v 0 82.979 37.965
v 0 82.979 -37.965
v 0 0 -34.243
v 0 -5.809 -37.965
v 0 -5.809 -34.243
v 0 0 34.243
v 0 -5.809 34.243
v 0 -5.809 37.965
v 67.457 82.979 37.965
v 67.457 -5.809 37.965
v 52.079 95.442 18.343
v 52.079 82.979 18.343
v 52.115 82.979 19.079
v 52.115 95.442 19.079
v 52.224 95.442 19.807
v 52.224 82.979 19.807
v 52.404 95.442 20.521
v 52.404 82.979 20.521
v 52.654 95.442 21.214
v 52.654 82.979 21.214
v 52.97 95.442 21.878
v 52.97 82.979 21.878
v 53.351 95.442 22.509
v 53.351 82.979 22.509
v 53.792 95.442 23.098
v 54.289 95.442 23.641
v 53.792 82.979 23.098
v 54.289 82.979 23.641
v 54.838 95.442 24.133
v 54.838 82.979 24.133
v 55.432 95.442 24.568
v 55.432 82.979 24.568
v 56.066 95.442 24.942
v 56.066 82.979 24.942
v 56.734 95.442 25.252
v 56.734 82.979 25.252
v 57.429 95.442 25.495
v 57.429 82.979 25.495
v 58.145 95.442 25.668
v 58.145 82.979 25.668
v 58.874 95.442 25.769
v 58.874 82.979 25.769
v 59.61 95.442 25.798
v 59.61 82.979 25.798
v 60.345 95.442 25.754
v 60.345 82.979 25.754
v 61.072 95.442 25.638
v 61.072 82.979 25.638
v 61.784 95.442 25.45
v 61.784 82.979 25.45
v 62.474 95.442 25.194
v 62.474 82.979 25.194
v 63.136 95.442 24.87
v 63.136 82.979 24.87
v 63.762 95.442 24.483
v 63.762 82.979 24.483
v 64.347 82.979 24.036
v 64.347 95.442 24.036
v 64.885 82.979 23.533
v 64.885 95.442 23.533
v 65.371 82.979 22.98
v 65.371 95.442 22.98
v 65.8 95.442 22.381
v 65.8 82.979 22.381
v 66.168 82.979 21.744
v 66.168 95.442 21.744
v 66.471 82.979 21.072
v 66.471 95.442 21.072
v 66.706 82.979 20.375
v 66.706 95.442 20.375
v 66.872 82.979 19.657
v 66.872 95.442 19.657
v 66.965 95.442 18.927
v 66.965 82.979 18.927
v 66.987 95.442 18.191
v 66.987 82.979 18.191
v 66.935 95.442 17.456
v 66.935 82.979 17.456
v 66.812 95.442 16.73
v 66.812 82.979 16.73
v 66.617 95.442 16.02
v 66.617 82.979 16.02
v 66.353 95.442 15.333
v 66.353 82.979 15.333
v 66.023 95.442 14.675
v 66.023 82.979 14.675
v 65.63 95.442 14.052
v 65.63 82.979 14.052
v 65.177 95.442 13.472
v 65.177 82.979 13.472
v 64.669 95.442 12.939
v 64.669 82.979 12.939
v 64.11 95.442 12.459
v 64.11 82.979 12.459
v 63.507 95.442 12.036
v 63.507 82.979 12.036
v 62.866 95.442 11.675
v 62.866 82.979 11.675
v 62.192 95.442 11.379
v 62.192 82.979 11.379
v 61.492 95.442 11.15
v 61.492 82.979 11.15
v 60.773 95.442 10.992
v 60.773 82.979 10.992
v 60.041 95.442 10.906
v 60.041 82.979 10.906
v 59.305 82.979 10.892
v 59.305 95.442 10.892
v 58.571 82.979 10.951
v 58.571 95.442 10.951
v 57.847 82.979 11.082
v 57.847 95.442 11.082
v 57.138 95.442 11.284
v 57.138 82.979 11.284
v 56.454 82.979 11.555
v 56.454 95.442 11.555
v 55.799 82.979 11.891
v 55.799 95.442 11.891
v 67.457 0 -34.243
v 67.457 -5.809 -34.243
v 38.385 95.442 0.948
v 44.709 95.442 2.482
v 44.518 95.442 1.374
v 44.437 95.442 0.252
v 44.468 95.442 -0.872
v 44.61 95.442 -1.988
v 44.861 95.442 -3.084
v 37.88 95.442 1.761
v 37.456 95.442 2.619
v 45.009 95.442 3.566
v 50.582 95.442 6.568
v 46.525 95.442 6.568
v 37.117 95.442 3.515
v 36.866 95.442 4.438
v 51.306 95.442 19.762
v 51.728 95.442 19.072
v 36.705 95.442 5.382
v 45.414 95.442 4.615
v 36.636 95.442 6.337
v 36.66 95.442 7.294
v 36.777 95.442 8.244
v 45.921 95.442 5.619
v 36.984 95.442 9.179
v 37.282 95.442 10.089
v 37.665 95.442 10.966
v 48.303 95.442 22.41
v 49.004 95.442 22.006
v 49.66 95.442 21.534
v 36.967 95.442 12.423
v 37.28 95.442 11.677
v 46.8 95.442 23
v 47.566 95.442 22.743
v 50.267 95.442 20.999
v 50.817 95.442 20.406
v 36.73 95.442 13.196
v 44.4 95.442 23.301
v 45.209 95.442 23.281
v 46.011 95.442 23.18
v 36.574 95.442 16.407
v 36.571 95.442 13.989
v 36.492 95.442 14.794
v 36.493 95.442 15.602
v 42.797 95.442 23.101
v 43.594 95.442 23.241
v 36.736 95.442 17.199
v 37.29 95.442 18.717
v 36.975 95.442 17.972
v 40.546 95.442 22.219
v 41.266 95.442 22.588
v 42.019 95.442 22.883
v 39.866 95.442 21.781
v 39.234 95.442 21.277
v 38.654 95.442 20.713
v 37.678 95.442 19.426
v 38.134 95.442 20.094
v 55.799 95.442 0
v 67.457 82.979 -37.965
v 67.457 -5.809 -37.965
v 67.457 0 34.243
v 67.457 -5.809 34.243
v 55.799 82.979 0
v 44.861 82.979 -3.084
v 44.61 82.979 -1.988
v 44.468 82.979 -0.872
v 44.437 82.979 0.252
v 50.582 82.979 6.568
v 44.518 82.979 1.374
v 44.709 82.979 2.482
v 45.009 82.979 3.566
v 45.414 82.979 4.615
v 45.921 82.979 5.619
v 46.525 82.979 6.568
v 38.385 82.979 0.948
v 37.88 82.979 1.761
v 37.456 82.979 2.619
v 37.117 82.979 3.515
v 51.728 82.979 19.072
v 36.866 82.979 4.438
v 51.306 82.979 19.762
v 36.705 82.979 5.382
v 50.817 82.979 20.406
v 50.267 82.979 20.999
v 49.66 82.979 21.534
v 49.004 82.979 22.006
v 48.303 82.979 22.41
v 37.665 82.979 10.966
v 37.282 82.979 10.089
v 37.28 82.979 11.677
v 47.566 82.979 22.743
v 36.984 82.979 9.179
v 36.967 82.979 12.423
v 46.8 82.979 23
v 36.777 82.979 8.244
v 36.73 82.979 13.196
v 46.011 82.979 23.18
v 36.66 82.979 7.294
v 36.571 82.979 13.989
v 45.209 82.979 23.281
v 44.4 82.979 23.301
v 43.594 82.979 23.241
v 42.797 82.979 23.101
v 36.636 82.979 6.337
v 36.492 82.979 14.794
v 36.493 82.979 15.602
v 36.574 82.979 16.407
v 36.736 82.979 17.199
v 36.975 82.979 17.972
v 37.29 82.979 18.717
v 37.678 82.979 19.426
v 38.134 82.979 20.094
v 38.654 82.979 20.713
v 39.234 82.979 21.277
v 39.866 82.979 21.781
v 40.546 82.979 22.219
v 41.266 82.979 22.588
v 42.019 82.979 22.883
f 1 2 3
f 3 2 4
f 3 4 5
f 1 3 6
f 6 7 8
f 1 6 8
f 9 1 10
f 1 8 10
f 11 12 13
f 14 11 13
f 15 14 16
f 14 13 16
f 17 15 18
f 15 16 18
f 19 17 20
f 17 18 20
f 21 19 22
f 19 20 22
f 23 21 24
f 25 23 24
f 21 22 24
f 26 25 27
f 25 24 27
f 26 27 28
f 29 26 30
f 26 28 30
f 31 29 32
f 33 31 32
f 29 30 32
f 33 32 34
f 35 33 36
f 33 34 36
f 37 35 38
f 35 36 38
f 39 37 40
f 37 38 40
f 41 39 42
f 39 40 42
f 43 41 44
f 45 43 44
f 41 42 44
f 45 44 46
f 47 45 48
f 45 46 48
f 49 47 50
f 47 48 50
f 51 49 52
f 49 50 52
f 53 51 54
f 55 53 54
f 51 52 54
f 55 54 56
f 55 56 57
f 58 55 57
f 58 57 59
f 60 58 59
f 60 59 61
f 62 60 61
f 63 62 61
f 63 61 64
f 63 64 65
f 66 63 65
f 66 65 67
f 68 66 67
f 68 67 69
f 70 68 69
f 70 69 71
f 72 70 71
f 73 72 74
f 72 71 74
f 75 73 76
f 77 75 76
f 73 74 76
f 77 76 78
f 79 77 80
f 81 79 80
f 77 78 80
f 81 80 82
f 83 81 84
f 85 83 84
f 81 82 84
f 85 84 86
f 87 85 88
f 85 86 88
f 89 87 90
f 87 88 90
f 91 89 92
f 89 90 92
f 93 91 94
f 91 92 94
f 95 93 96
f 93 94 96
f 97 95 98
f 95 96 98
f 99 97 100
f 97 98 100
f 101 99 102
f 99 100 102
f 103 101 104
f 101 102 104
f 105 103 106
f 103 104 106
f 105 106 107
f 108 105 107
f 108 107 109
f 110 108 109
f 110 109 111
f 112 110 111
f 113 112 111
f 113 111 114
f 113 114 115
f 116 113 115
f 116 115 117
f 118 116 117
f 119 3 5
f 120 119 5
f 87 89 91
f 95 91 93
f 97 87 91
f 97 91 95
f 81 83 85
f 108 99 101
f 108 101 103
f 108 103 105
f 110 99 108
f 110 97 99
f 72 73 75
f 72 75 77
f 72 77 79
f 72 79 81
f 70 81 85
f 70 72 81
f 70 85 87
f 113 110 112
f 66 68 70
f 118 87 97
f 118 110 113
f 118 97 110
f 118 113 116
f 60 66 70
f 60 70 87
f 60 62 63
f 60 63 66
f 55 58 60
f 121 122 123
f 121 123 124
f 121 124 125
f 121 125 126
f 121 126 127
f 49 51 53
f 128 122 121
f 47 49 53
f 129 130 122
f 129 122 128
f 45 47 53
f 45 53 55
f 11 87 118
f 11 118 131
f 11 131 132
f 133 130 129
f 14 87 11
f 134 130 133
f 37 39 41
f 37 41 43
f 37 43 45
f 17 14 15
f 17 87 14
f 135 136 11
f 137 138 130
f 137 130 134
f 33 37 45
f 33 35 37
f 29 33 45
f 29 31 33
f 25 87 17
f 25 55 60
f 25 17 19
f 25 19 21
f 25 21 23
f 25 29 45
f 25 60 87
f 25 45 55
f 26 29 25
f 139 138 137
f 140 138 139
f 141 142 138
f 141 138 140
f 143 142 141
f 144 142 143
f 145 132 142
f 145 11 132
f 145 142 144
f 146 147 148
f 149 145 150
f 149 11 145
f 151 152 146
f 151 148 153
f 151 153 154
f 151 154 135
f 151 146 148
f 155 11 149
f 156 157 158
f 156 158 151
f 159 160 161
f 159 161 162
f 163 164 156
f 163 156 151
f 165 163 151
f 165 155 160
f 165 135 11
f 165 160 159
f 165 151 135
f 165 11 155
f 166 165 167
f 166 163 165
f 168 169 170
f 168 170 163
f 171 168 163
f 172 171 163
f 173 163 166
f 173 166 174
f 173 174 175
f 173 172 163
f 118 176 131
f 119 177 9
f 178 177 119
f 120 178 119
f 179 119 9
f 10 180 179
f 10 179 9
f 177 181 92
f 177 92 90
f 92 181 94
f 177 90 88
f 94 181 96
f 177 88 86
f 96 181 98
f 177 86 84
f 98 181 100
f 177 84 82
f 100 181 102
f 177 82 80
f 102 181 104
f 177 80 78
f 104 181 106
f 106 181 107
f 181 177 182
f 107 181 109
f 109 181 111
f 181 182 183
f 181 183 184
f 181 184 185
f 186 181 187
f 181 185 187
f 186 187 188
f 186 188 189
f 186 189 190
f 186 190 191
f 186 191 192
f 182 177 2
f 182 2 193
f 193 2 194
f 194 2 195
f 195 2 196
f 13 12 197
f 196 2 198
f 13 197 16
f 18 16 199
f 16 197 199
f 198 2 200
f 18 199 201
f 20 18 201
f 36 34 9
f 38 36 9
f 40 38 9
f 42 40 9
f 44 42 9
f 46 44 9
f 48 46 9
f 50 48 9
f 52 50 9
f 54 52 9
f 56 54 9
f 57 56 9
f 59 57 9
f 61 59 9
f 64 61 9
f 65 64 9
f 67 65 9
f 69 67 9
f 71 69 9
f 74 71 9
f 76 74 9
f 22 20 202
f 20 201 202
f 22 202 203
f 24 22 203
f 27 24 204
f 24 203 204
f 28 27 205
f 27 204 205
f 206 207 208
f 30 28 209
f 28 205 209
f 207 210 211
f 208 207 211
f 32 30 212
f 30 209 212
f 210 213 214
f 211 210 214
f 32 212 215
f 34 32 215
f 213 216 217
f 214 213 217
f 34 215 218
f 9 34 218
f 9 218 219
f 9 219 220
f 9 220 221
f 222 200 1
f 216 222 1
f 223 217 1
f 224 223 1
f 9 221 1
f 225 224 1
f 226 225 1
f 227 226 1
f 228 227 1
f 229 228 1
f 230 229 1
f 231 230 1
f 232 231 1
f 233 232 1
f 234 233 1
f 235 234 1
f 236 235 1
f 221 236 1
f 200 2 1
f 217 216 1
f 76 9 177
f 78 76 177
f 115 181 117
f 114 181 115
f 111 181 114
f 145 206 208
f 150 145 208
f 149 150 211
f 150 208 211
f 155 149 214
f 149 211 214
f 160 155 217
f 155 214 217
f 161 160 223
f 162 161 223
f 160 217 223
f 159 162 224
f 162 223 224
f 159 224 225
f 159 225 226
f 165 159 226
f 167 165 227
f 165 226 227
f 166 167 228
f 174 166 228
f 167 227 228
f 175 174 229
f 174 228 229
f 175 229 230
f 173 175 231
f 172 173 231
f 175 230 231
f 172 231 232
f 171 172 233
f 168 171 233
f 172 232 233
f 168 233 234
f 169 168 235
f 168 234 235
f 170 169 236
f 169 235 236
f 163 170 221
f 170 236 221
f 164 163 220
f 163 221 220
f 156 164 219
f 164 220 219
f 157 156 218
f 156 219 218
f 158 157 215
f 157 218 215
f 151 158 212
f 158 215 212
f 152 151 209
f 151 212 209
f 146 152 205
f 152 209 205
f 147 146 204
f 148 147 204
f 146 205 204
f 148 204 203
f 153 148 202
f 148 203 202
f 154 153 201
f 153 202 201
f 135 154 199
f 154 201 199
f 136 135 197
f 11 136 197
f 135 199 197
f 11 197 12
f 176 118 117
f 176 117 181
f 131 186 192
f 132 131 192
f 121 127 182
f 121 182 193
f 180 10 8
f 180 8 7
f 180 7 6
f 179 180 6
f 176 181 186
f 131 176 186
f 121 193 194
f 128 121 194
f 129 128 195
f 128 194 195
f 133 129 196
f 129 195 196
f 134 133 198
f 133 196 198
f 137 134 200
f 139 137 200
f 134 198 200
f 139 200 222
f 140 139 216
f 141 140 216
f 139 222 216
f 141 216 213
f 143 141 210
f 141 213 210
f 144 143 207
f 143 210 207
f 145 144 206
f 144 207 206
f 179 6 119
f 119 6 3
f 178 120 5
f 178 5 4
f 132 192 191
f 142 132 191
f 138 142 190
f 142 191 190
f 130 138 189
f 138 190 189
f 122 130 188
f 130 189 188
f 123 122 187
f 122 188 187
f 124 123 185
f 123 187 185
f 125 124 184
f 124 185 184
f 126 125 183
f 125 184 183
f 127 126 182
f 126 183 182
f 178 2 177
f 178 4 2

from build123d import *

# Parameters (mm, degrees)
F1_DEPTH = 67.4566328526
F2_DEPTH = 6.2197912484
F4_DEPTH = 12.4627631158


with BuildPart() as f1:
    # F0 (on Right) → F1 (new body)
    with BuildSketch(Plane.YZ):
        Polygon((-5.8088302612, 34.2432931066), (0, 34.2432931066), (0, -34.2432931066), (-5.8088302612, -34.2432931066), (-5.8088302612, -37.9646643996), (76.7590999603, -37.9646643996), (76.7590999603, 37.9646643996), (-5.8088302612, 37.9646643996), align=None)
    extrude(amount=F1_DEPTH)

    # F2 (add): a face of the model
    f2_faces = [f1.faces().sort_by_distance(p)[0] for p in [
        (33.7283164263, 76.7590999603, 0),
    ]]
    extrude(f2_faces, amount=F2_DEPTH)

    # F3 (on face) → F4 (join)
    with BuildSketch(Plane(origin=(0, 82.9788912088, 0), x_dir=(-1, 0, 0), z_dir=(0, 1, 0))):
        with BuildLine():
            ThreePointArc((-38.3854716222, 0.9479600765), (-36.6591605512, 5.8587284108), (-37.6652367413, 10.9659396112))
            ThreePointArc((-37.6652367413, 10.9659396112), (-40.901393767, 22.4123427927), (-52.0788472287, 18.3432652315))
            ThreePointArc((-52.0788472287, 18.3432652315), (-65.9917417473, 22.0669934876), (-55.7989236075, 11.8914716641))
            Line((-55.7989236075, 11.8914716641), (-55.7989236075, 0))
            Line((-55.7989236075, 0), (-50.582356751, 6.5680034459))
            Line((-50.582356751, 6.5680034459), (-46.5246960521, 6.5680034459))
            ThreePointArc((-46.5246960521, 6.5680034459), (-44.599657899, 1.9303920858), (-44.8609884943, -3.0840787076))
            Line((-44.8609884943, -3.0840787076), (-38.3854716222, 0.9479600765))
        make_face()
    extrude(amount=F4_DEPTH)


solid = f1.part
